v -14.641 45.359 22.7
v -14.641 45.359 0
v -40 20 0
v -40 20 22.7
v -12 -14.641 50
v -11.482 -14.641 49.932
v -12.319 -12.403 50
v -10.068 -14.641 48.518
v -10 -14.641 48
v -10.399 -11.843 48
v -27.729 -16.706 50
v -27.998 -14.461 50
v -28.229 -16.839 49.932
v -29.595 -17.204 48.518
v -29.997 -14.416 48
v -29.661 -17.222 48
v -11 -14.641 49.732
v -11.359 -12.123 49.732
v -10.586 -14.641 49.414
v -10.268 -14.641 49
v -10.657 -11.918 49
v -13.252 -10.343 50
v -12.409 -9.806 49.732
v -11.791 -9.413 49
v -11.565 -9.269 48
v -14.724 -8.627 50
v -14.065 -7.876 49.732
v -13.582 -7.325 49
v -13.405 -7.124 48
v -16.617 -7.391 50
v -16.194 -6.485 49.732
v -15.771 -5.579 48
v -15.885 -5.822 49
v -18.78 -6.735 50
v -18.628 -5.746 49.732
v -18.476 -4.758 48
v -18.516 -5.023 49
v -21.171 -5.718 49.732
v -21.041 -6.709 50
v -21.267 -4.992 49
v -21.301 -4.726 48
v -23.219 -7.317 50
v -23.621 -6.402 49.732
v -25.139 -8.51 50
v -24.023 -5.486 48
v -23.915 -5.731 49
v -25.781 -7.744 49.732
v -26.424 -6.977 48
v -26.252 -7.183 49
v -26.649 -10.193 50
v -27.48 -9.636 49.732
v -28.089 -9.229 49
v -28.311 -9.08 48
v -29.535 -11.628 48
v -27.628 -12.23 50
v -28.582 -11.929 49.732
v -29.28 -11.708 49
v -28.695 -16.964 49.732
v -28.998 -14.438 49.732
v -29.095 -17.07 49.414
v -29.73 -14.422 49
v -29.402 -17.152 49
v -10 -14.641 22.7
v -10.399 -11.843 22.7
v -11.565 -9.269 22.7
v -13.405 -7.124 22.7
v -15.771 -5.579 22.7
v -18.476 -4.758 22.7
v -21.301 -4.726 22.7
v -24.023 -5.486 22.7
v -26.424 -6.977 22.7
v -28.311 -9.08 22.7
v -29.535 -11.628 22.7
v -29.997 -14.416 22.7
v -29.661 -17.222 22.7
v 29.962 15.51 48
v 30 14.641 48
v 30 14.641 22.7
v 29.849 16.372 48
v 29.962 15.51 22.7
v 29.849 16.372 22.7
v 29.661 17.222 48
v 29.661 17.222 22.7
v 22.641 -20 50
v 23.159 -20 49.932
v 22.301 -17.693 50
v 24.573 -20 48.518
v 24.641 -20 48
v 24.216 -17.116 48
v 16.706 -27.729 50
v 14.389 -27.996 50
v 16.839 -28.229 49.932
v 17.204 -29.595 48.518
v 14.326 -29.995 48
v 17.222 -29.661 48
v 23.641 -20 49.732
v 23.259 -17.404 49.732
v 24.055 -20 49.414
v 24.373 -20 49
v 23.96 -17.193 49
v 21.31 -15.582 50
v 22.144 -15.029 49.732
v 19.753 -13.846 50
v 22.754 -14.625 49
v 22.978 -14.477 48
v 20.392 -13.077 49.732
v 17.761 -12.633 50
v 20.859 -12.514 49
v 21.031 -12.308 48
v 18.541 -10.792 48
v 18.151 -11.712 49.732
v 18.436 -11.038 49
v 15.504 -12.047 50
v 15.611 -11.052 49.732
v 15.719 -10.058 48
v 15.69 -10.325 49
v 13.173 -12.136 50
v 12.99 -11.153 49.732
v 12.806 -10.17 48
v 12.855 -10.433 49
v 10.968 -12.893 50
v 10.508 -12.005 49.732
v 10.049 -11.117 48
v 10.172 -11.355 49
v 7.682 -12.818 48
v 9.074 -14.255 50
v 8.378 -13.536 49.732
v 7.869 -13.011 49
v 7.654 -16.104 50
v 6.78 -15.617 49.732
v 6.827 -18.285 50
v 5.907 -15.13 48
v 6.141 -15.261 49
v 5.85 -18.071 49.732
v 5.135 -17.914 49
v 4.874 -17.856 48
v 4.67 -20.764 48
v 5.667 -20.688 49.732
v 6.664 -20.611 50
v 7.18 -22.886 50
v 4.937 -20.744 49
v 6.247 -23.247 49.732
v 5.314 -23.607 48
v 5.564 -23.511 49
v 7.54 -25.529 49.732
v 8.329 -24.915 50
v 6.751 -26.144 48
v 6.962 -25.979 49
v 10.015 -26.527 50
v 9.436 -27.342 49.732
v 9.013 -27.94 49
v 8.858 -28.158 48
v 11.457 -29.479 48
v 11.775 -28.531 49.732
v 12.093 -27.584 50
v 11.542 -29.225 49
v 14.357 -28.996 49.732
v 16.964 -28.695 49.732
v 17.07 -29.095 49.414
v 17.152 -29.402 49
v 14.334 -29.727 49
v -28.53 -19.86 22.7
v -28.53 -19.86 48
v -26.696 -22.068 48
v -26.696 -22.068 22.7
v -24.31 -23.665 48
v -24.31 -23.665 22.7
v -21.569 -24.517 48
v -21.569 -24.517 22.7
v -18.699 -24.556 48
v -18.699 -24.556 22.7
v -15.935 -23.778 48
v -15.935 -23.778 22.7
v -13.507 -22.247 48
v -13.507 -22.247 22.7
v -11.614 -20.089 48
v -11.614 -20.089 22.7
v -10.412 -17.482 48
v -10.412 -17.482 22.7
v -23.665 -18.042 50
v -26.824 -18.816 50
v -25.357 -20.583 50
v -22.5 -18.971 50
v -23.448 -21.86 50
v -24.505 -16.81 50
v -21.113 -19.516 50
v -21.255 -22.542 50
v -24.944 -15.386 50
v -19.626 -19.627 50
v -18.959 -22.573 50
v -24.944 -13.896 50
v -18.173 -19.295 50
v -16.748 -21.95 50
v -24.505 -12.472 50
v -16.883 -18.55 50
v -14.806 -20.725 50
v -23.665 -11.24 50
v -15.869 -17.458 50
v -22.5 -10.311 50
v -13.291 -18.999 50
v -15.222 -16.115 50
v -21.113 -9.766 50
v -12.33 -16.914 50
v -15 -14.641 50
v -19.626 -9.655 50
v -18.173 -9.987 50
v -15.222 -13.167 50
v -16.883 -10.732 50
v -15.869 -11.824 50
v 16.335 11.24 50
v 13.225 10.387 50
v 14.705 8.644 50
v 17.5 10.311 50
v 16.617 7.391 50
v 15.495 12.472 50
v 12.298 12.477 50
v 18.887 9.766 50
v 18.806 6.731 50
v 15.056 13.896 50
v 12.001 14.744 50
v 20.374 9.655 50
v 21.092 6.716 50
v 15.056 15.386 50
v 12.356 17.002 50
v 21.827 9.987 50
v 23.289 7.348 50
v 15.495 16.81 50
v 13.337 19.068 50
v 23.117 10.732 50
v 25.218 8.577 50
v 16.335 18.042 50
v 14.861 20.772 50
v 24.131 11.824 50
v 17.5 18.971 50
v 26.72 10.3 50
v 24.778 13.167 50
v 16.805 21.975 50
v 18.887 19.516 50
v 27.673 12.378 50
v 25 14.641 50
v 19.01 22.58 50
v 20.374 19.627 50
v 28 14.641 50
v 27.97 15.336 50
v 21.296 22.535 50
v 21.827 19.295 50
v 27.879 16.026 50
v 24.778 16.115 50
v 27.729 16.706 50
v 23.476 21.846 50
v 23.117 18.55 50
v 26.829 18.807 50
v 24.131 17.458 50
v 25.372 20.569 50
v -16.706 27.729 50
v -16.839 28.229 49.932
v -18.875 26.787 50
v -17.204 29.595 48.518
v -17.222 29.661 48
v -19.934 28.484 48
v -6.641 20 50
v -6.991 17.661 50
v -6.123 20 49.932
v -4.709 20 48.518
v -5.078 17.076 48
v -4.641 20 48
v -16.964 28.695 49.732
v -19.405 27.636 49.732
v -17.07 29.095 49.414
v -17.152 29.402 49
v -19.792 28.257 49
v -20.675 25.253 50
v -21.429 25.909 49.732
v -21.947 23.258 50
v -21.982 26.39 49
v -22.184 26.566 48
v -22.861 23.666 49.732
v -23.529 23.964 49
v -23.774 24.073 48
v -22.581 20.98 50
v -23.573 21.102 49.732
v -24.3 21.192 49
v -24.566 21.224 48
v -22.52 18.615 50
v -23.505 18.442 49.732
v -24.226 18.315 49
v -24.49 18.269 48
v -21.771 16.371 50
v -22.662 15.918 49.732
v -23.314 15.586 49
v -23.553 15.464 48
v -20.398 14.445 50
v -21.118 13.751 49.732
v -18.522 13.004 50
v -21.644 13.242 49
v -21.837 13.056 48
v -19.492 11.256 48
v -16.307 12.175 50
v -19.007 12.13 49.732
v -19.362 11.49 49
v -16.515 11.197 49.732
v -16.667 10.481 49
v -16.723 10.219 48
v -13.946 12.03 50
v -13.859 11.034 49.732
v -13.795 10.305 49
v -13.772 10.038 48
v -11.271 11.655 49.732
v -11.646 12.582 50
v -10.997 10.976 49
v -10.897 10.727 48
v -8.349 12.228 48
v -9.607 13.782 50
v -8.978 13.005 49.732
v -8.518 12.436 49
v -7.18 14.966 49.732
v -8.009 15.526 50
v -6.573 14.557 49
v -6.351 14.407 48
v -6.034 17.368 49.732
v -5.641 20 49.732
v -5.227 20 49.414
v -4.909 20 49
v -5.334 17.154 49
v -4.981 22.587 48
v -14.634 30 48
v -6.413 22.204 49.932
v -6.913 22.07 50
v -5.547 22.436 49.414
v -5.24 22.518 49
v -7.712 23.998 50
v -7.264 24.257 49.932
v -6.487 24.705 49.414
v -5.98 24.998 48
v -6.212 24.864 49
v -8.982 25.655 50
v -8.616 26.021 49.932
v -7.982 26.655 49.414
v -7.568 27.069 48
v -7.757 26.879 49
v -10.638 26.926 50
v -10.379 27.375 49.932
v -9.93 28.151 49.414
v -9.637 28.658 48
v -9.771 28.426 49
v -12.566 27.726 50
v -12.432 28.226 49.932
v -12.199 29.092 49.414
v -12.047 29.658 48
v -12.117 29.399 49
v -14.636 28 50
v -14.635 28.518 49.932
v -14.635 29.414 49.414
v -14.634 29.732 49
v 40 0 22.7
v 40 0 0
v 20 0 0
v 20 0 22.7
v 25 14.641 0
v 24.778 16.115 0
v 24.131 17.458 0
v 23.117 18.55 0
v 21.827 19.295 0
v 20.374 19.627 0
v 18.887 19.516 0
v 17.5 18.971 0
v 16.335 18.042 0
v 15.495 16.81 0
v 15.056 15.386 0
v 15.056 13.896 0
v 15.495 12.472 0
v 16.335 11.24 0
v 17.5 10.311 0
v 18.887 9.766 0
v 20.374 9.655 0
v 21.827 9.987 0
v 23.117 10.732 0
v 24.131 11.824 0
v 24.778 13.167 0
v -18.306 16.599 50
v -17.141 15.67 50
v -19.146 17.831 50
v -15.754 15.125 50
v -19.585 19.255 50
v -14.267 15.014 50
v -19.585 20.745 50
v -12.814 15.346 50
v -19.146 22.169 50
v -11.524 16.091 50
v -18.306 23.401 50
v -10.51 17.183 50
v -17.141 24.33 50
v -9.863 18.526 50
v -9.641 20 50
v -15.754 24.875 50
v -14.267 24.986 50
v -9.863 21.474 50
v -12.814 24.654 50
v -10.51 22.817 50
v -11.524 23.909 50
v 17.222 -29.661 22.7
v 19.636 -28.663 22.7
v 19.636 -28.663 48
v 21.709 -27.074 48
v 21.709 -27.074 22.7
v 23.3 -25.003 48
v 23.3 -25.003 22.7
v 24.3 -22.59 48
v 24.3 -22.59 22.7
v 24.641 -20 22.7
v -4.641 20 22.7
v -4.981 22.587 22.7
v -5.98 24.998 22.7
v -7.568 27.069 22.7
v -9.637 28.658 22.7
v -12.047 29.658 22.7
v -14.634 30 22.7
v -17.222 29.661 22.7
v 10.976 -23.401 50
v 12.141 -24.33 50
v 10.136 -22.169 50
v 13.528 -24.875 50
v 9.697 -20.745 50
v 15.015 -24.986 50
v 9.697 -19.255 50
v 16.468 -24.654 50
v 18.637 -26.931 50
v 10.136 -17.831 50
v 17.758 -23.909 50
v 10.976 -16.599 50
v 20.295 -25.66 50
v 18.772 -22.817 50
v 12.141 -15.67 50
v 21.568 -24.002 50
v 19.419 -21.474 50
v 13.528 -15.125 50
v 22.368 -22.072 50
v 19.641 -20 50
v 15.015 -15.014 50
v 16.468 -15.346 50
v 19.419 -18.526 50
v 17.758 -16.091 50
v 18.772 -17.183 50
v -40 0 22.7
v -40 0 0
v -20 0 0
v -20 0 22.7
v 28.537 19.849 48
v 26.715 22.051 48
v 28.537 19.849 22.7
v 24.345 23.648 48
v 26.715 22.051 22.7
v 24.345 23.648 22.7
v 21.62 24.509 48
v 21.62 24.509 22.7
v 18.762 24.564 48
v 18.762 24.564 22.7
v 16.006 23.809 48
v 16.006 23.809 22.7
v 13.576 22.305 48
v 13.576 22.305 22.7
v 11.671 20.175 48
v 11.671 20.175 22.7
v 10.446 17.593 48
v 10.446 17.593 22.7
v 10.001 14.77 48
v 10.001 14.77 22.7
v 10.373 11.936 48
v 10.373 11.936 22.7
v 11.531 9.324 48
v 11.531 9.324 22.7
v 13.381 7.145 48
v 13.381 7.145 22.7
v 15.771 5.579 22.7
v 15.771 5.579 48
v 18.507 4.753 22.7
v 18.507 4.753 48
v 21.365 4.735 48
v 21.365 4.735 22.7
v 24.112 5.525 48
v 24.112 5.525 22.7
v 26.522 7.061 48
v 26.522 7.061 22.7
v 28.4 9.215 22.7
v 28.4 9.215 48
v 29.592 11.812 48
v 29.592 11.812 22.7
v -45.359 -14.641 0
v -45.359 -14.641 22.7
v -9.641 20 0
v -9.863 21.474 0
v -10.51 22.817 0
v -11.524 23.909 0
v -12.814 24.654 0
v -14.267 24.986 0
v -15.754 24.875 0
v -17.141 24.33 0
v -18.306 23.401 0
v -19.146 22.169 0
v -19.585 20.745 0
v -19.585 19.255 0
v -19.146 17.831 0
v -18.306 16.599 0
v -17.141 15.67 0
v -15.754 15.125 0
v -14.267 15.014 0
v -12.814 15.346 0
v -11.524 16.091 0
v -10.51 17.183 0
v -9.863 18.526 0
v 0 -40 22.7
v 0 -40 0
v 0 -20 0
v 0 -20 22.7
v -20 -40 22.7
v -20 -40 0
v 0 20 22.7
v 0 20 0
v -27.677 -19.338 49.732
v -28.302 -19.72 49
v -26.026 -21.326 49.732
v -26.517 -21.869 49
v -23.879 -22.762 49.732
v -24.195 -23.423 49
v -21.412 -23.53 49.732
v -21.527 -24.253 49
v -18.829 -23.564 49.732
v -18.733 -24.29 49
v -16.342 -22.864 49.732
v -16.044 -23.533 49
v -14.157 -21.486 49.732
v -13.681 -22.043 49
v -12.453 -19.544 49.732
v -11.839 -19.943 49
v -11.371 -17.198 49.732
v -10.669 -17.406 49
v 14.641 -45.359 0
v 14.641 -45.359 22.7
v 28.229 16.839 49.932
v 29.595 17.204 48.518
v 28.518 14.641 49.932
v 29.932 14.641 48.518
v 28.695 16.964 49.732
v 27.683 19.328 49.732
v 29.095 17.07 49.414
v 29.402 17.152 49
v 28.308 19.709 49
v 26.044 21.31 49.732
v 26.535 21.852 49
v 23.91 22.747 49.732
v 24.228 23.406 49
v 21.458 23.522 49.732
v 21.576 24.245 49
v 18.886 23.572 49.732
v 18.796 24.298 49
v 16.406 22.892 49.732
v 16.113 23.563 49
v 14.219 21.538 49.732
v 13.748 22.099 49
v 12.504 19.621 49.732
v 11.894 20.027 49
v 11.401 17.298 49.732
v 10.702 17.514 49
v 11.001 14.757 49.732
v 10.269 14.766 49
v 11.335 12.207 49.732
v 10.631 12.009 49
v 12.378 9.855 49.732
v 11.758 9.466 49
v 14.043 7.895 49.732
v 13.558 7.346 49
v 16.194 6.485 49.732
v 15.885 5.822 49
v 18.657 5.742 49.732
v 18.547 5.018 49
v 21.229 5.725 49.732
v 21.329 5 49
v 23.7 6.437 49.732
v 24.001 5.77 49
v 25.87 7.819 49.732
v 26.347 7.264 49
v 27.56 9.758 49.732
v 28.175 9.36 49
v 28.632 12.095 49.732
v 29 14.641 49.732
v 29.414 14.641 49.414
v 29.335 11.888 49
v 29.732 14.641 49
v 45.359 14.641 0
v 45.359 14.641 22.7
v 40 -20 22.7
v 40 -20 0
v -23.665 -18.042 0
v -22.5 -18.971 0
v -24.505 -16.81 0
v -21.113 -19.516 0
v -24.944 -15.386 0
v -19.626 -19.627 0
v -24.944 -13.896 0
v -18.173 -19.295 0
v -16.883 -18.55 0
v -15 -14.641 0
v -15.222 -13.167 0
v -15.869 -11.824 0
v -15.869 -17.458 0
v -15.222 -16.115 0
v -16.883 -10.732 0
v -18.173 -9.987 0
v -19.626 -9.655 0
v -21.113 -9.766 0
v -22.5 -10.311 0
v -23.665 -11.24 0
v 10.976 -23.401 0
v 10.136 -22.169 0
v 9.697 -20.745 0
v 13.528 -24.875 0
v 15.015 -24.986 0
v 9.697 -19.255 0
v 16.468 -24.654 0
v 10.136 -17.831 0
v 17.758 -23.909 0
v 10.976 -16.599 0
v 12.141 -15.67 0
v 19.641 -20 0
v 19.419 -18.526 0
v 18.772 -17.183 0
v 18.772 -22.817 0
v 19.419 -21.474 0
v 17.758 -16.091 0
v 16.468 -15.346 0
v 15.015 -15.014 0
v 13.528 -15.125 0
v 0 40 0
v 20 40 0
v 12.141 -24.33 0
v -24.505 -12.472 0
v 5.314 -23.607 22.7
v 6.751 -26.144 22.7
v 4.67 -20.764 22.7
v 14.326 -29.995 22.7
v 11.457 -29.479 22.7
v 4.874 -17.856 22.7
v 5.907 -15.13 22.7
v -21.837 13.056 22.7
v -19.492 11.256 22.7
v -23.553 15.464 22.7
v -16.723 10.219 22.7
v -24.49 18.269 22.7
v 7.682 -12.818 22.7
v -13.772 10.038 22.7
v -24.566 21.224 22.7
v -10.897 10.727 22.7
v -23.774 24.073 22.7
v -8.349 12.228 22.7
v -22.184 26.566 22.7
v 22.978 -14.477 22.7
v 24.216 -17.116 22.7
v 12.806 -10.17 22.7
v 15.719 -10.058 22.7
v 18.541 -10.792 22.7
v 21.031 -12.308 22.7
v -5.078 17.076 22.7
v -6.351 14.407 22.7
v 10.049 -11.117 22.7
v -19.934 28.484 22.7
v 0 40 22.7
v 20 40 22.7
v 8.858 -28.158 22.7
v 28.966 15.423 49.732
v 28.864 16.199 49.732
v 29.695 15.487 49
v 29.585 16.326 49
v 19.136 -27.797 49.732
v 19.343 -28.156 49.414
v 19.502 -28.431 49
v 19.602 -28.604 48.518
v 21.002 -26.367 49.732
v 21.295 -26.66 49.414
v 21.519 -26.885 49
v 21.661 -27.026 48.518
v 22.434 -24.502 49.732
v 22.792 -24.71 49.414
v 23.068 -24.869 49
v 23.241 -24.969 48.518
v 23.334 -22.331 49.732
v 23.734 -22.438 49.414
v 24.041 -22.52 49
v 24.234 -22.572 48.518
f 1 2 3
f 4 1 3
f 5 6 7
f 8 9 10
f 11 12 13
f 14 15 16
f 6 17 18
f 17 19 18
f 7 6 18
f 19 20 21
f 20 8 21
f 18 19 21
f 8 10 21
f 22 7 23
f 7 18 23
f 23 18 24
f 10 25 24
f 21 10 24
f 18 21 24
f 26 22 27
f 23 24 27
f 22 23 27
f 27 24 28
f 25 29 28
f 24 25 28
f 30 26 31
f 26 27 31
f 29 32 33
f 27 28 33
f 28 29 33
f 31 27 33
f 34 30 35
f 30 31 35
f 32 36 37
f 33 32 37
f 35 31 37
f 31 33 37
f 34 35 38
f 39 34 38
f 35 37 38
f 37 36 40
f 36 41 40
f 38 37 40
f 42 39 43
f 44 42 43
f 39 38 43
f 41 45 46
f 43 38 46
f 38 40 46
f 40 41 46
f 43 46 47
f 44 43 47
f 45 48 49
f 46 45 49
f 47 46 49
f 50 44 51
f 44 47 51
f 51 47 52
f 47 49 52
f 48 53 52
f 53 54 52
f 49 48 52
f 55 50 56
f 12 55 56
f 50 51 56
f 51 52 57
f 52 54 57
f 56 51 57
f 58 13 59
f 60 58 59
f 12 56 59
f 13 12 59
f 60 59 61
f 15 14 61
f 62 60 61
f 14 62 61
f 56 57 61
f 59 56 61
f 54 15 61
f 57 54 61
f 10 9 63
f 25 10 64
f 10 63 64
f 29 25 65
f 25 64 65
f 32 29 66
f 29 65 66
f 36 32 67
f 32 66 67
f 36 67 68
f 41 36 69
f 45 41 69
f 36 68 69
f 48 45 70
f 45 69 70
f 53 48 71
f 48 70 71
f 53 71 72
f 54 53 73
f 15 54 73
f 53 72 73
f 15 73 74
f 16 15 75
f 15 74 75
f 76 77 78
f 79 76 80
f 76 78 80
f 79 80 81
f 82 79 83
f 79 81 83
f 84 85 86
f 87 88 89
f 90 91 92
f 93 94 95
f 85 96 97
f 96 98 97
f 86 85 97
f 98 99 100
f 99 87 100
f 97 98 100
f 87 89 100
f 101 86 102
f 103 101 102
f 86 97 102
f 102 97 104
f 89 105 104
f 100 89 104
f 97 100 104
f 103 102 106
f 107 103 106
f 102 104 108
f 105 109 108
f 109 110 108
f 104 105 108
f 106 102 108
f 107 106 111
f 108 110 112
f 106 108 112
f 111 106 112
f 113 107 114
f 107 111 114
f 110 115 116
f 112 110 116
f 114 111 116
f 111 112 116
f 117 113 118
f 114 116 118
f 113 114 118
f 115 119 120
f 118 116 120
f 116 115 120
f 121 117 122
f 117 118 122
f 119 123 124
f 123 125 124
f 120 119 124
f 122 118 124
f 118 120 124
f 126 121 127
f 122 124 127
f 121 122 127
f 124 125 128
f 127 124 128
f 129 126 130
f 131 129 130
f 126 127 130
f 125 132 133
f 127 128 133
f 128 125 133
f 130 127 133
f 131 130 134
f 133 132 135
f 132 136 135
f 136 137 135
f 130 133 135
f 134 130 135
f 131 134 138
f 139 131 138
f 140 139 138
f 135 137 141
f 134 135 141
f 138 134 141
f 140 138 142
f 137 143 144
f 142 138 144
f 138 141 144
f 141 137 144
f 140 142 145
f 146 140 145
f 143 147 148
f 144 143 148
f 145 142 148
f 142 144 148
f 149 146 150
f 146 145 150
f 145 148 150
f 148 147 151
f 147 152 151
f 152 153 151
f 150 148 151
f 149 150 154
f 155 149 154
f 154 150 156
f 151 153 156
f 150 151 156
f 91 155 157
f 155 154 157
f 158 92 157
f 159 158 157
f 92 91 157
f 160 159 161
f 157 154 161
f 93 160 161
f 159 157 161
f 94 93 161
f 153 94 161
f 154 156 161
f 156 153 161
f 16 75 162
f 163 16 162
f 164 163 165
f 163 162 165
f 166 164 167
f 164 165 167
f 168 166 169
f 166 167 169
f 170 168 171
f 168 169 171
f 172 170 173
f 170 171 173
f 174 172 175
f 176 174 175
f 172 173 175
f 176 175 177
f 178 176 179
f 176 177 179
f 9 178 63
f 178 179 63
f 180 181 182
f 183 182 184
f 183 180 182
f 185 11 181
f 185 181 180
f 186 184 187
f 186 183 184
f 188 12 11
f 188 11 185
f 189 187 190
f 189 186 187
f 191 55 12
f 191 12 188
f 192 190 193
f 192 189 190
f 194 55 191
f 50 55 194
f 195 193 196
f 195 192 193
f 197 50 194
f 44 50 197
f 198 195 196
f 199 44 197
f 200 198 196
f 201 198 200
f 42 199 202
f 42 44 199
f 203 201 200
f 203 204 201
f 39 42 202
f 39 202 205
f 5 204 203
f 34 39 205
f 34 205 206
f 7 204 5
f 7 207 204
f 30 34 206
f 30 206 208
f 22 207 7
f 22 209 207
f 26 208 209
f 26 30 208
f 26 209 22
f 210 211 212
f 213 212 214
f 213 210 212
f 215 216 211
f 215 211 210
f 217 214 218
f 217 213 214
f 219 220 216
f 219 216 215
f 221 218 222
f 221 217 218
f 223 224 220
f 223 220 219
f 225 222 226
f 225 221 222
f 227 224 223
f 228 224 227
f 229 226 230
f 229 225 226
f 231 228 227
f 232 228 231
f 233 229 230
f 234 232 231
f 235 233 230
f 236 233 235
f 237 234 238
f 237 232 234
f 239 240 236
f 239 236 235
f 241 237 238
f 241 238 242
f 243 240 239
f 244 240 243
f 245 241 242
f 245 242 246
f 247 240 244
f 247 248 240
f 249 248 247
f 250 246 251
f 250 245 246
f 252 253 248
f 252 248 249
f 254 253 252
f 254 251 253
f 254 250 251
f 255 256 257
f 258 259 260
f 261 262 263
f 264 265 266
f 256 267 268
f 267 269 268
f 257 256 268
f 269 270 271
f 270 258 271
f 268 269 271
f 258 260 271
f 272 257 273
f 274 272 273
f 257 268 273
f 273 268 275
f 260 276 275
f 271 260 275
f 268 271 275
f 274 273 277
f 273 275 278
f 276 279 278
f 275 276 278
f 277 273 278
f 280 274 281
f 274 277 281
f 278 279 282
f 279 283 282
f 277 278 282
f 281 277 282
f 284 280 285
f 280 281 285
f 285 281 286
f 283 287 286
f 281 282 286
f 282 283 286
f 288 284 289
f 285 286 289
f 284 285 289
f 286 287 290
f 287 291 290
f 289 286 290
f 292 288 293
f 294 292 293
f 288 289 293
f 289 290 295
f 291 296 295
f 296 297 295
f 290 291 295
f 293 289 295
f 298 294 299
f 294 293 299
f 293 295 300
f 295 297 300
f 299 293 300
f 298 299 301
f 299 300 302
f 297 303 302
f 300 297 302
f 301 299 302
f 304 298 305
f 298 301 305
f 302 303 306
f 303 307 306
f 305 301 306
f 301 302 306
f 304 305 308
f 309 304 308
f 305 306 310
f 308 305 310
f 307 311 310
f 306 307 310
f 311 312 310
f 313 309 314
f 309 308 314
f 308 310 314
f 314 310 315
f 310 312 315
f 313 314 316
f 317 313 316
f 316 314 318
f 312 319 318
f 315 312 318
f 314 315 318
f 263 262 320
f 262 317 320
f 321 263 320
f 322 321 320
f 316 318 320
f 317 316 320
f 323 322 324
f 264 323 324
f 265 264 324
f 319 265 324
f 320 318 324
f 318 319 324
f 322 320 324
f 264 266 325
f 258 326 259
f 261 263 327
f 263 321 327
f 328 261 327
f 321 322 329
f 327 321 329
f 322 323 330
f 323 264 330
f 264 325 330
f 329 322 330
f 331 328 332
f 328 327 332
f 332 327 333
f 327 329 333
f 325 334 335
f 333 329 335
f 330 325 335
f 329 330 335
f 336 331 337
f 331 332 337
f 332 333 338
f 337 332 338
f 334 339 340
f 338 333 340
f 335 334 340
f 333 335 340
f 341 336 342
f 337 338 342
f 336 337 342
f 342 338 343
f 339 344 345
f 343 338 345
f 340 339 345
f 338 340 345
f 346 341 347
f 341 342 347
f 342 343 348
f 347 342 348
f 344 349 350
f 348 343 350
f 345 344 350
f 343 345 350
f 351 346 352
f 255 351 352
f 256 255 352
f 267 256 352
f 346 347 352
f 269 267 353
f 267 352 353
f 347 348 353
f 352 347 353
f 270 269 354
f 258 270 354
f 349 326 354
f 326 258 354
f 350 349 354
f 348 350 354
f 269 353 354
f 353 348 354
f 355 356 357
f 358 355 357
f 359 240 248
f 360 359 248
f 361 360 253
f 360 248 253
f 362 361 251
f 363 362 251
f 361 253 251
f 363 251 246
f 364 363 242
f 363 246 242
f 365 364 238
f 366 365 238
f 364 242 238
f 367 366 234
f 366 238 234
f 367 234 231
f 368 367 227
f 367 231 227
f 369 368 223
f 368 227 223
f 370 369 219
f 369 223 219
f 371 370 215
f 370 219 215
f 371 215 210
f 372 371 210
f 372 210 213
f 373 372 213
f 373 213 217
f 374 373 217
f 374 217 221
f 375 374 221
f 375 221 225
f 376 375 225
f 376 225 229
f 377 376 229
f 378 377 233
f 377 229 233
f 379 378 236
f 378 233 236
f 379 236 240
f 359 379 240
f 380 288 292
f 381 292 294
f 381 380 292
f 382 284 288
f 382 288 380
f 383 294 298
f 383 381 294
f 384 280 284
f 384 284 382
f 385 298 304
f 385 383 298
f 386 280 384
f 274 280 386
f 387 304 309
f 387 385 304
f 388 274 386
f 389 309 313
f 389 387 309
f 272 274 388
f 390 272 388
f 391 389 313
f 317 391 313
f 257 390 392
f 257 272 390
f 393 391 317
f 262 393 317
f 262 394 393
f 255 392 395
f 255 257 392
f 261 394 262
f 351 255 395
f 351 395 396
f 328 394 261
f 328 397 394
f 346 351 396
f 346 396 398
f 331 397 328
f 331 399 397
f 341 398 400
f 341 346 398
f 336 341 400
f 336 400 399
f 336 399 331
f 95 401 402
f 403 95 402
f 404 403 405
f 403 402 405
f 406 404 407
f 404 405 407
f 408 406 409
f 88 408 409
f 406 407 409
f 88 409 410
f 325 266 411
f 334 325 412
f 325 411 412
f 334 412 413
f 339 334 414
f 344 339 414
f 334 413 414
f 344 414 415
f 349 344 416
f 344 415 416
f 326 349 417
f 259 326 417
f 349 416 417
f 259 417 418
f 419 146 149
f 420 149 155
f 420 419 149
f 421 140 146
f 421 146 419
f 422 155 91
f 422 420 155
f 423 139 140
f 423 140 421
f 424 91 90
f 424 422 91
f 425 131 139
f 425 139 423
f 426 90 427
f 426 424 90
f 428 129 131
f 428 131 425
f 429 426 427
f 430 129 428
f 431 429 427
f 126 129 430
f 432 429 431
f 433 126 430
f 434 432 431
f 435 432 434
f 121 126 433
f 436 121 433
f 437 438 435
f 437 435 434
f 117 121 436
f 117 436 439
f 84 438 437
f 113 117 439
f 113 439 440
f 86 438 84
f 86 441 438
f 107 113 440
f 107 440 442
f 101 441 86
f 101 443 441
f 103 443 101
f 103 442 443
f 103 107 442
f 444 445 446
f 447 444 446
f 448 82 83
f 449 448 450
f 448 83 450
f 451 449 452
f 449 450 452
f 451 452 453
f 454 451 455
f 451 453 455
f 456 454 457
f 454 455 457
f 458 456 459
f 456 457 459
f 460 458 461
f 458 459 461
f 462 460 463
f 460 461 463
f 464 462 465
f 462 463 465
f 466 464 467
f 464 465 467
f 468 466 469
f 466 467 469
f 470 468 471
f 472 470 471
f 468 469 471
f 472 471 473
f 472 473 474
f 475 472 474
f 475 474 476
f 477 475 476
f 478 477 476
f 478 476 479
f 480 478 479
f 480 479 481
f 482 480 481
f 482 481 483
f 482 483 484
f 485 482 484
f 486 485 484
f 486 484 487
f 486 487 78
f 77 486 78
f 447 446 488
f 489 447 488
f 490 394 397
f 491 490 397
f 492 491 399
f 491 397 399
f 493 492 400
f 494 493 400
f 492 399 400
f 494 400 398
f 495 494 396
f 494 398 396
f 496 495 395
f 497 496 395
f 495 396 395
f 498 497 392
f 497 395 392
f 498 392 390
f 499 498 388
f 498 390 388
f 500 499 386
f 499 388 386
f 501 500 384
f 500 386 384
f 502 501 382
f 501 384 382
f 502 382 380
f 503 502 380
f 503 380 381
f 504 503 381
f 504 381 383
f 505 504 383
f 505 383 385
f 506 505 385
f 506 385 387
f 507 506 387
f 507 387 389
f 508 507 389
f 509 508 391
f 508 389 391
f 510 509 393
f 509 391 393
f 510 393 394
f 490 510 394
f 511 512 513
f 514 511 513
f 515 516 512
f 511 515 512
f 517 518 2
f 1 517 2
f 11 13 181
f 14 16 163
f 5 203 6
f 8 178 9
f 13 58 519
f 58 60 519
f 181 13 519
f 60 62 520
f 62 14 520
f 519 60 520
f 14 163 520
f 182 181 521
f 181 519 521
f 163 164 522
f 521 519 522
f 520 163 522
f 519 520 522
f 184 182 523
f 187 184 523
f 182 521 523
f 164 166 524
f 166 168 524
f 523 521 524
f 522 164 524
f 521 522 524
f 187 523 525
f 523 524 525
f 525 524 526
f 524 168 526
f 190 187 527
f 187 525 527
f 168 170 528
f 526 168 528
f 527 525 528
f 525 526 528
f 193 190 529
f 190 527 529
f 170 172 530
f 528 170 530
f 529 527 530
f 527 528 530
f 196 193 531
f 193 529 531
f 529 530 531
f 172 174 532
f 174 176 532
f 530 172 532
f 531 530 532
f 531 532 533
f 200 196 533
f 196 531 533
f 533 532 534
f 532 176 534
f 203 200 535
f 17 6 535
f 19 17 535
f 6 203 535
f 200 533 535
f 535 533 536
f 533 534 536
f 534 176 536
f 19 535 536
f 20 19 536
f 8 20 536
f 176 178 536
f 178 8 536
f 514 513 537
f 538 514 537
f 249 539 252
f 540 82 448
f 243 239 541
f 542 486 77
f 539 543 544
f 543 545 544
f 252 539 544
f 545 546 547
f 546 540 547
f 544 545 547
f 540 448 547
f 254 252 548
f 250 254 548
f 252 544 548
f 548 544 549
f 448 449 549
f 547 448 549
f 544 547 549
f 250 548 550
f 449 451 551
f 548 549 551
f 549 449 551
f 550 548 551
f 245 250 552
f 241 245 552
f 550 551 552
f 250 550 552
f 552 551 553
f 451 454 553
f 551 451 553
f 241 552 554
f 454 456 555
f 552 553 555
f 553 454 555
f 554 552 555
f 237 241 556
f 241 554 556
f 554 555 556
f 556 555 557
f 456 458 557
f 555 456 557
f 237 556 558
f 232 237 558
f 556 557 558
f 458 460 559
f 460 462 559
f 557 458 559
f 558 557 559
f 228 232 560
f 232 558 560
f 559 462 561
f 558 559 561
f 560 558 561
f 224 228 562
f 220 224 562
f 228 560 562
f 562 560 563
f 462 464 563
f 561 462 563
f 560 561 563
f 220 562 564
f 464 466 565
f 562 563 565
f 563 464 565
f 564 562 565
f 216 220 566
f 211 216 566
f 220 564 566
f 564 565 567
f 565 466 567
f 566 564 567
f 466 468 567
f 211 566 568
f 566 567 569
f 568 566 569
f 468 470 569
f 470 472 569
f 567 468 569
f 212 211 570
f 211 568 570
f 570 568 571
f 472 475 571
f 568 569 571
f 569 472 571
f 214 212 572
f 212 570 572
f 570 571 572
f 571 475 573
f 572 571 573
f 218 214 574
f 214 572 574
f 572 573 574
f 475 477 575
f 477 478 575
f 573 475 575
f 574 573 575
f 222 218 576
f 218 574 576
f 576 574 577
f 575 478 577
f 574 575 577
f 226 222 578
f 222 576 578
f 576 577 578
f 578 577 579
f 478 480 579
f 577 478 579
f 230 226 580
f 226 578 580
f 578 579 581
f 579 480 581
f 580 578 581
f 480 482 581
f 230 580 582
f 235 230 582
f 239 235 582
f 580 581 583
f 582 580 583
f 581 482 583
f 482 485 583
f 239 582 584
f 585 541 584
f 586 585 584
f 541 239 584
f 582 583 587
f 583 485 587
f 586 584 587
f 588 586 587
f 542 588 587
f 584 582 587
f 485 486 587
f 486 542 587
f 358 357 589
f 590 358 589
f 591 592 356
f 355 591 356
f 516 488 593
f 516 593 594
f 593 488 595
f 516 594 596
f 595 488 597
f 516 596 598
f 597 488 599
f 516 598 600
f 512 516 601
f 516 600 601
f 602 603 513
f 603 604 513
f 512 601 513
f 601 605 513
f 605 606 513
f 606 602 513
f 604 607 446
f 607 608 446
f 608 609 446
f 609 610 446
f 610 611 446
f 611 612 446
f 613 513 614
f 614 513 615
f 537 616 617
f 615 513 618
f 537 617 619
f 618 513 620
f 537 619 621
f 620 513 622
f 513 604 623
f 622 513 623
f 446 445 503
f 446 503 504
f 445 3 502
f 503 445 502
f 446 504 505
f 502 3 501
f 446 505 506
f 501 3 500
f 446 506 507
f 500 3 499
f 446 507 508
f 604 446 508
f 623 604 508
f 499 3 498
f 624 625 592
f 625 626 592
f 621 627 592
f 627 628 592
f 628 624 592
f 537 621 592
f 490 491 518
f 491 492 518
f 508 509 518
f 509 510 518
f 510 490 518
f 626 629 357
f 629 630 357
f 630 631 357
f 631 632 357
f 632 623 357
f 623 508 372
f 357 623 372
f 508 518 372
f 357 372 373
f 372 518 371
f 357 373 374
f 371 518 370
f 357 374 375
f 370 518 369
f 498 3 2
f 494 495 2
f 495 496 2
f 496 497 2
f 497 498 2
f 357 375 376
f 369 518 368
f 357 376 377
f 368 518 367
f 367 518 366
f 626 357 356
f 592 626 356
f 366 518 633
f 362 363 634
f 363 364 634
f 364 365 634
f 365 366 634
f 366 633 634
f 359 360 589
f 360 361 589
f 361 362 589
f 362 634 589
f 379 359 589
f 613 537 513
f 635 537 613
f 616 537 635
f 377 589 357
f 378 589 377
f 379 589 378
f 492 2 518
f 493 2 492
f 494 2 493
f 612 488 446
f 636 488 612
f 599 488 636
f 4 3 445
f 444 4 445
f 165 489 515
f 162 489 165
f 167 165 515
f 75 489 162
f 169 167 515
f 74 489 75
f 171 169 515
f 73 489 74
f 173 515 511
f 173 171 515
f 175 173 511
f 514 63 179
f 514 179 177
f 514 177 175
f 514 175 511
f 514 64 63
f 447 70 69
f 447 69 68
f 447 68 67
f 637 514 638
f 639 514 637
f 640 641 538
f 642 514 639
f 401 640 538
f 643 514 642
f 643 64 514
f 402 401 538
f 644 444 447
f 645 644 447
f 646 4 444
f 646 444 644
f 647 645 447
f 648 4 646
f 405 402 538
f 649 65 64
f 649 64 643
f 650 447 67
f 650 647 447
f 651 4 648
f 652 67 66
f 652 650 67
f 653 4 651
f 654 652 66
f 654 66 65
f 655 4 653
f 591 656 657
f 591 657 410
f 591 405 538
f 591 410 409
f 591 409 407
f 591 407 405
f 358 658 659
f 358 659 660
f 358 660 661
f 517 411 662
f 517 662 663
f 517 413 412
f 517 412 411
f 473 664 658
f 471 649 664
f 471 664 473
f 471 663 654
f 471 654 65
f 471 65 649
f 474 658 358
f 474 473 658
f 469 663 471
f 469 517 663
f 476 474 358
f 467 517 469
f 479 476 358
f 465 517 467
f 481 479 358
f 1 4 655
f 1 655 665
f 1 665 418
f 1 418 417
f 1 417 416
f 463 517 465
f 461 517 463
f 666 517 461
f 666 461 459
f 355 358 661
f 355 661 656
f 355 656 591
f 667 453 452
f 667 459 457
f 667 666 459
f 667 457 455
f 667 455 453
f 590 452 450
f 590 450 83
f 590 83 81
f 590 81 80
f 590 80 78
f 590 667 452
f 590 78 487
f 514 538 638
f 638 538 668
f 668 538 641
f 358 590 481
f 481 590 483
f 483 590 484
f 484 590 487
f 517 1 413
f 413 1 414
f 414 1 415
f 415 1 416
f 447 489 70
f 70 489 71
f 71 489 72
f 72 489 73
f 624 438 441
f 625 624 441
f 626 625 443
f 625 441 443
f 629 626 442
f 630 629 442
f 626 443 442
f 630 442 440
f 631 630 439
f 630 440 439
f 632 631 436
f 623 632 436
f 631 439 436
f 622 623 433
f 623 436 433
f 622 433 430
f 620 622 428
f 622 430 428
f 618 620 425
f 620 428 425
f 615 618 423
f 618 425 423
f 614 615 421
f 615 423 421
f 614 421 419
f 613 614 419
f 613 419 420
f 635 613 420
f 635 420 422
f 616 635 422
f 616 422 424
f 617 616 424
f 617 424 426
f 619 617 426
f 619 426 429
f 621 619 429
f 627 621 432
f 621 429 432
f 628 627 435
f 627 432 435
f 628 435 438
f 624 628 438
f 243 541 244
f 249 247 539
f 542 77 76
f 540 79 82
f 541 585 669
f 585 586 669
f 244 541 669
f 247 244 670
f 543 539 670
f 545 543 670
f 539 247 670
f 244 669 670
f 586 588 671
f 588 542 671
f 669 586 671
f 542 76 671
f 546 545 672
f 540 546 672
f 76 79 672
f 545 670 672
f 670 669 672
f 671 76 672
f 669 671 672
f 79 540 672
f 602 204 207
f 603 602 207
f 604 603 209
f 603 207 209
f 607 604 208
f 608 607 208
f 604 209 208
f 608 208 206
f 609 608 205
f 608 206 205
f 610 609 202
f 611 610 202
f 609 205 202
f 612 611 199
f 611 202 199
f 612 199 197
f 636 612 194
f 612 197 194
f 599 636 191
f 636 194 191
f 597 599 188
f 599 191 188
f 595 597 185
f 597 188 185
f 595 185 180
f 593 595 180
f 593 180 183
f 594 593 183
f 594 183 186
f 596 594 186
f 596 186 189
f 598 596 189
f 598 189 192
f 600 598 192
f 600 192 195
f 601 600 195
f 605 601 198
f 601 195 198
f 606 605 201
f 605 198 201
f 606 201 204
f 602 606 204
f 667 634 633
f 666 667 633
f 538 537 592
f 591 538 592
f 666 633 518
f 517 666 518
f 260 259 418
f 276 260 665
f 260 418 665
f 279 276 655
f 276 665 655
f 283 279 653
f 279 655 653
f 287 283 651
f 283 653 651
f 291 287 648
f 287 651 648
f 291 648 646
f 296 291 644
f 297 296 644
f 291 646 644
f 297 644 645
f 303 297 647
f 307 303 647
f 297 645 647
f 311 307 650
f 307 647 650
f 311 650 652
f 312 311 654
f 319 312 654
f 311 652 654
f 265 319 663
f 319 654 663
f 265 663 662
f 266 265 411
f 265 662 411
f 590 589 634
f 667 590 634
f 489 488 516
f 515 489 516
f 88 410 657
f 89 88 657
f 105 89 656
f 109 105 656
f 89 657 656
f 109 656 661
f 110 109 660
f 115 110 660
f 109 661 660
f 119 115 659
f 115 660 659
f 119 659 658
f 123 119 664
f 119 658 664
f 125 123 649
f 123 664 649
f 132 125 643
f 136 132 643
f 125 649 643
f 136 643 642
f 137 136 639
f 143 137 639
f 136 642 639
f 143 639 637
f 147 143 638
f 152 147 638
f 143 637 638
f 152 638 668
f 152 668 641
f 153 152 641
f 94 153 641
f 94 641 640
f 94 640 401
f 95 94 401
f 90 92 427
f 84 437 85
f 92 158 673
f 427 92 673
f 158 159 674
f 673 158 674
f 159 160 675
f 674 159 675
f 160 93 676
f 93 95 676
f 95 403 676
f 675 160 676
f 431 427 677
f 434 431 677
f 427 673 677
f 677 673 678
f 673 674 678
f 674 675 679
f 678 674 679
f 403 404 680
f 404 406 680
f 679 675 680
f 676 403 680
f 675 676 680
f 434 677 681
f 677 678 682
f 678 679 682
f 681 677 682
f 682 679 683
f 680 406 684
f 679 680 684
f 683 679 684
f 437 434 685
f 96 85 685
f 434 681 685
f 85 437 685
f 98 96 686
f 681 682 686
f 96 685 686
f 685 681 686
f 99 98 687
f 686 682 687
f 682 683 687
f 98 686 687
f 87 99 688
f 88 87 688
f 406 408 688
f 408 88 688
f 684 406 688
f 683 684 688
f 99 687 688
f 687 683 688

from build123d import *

# Parameters (mm, degrees)
F1_DEPTH = 22.7
F2_DEPTH = 50
F3_R     = 5
F5_DEPTH = 50
F4_R     = 5
F6_DEPTH = 50
F7_R     = 2


with BuildPart() as f1:
    # F0 (on Top) → F1 (new body)
    with BuildSketch(Plane.XY):
        Polygon((0, -20), (0, 0), (-20, 0), (-45.358984, -14.641016), (-20, -40), (0, -40), align=None)
        with BuildLine():
            ThreePointArc((-10, -14.641016), (-18.69862, -24.555975), (-29.661282, -17.221643))
            ThreePointArc((-29.661282, -17.221643), (-21.30138, -4.726057), (-10, -14.641016))
        make_face(mode=Mode.SUBTRACT)
        Polygon((-20, 0), (0, 0), (0, 20), (-14.641016, 45.358984), (-40, 20), (-40, 0), align=None)
        with BuildLine():
            ThreePointArc((-4.641016, 20), (-20.731736, 12.068851), (-17.221643, 29.661282))
            ThreePointArc((-17.221643, 29.661282), (-8.550296, 27.931149), (-4.641016, 20))
        make_face(mode=Mode.SUBTRACT)
        with BuildLine():
            ThreePointArc((-4.641016, 20), (-8.550296, 27.931149), (-17.221643, 29.661282))
            ThreePointArc((-17.221643, 29.661282), (-20.731736, 12.068851), (-4.641016, 20))
        make_face()
        with BuildLine():
            ThreePointArc((-10, -14.641016), (-21.30138, -4.726057), (-29.661282, -17.221643))
            ThreePointArc((-29.661282, -17.221643), (-18.69862, -24.555975), (-10, -14.641016))
        make_face()
        Polygon((0, 20), (0, 0), (20, 0), (45.358984, 14.641016), (20, 40), (0, 40), align=None)
        with BuildLine():
            ThreePointArc((30, 14.641016), (10.085041, 13.339636), (29.661282, 17.221643))
            ThreePointArc((29.661282, 17.221643), (29.914959, 15.942396), (30, 14.641016))
        make_face(mode=Mode.SUBTRACT)
        with BuildLine():
            ThreePointArc((24.641016, -20), (6.709867, -13.90928), (17.221643, -29.661282))
            ThreePointArc((17.221643, -29.661282), (22.572166, -26.09072), (24.641016, -20))
        make_face()
        with BuildLine():
            ThreePointArc((30, 14.641016), (29.914959, 15.942396), (29.661282, 17.221643))
            ThreePointArc((29.661282, 17.221643), (10.085041, 13.339636), (30, 14.641016))
        make_face()
        Polygon((20, 0), (0, 0), (0, -20), (14.641016, -45.358984), (40, -20), (40, 0), align=None)
        with BuildLine():
            ThreePointArc((24.641016, -20), (22.572166, -26.09072), (17.221643, -29.661282))
            ThreePointArc((17.221643, -29.661282), (6.709867, -13.90928), (24.641016, -20))
        make_face(mode=Mode.SUBTRACT)
    extrude(amount=F1_DEPTH)

    # F0 (on Top) → F2 (join)
    with BuildSketch(Plane.XY):
        with BuildLine():
            ThreePointArc((-10, -14.641016), (-21.30138, -4.726057), (-29.661282, -17.221643))
            ThreePointArc((-29.661282, -17.221643), (-18.69862, -24.555975), (-10, -14.641016))
        make_face()
        with BuildLine():
            ThreePointArc((-4.641016, 20), (-8.550296, 27.931149), (-17.221643, 29.661282))
            ThreePointArc((-17.221643, 29.661282), (-20.731736, 12.068851), (-4.641016, 20))
        make_face()
        with BuildLine():
            ThreePointArc((30, 14.641016), (29.914959, 15.942396), (29.661282, 17.221643))
            ThreePointArc((29.661282, 17.221643), (10.085041, 13.339636), (30, 14.641016))
        make_face()
        with BuildLine():
            ThreePointArc((24.641016, -20), (6.709867, -13.90928), (17.221643, -29.661282))
            ThreePointArc((17.221643, -29.661282), (22.572166, -26.09072), (24.641016, -20))
        make_face()
    extrude(amount=F2_DEPTH)

    # F3 (on face) → F5 (cut)
    with BuildSketch(Plane.XY.offset(50)):
        with Locations((20, 14.641016)):
            Circle(F3_R)
    extrude(amount=-F5_DEPTH, mode=Mode.SUBTRACT)

    # F3 (on face) + F4 (on face) → F6 (cut)
    with BuildSketch(Plane.XY.offset(50)):
        with Locations((20, 14.641016)):
            Circle(F3_R)
    with BuildSketch(Plane.XY.offset(50)):
        with Locations((-14.641016, 20)):
            Circle(F4_R)
        with Locations((-20, -14.641016)):
            Circle(F4_R)
        with Locations((14.641016, -20)):
            Circle(F4_R)
    extrude(amount=-F6_DEPTH, mode=Mode.SUBTRACT)

    # F7
    f7_edges = [f1.edges().sort_by_distance(p)[0] for p in [
        (-10.338718, -12.06039, 50),
        (12.06039, -10.338718, 50),
        (10, 14.641016, 50),
        (-24.641016, 20, 50),
    ]]
    fillet(f7_edges, radius=F7_R)


solid = f1.part
